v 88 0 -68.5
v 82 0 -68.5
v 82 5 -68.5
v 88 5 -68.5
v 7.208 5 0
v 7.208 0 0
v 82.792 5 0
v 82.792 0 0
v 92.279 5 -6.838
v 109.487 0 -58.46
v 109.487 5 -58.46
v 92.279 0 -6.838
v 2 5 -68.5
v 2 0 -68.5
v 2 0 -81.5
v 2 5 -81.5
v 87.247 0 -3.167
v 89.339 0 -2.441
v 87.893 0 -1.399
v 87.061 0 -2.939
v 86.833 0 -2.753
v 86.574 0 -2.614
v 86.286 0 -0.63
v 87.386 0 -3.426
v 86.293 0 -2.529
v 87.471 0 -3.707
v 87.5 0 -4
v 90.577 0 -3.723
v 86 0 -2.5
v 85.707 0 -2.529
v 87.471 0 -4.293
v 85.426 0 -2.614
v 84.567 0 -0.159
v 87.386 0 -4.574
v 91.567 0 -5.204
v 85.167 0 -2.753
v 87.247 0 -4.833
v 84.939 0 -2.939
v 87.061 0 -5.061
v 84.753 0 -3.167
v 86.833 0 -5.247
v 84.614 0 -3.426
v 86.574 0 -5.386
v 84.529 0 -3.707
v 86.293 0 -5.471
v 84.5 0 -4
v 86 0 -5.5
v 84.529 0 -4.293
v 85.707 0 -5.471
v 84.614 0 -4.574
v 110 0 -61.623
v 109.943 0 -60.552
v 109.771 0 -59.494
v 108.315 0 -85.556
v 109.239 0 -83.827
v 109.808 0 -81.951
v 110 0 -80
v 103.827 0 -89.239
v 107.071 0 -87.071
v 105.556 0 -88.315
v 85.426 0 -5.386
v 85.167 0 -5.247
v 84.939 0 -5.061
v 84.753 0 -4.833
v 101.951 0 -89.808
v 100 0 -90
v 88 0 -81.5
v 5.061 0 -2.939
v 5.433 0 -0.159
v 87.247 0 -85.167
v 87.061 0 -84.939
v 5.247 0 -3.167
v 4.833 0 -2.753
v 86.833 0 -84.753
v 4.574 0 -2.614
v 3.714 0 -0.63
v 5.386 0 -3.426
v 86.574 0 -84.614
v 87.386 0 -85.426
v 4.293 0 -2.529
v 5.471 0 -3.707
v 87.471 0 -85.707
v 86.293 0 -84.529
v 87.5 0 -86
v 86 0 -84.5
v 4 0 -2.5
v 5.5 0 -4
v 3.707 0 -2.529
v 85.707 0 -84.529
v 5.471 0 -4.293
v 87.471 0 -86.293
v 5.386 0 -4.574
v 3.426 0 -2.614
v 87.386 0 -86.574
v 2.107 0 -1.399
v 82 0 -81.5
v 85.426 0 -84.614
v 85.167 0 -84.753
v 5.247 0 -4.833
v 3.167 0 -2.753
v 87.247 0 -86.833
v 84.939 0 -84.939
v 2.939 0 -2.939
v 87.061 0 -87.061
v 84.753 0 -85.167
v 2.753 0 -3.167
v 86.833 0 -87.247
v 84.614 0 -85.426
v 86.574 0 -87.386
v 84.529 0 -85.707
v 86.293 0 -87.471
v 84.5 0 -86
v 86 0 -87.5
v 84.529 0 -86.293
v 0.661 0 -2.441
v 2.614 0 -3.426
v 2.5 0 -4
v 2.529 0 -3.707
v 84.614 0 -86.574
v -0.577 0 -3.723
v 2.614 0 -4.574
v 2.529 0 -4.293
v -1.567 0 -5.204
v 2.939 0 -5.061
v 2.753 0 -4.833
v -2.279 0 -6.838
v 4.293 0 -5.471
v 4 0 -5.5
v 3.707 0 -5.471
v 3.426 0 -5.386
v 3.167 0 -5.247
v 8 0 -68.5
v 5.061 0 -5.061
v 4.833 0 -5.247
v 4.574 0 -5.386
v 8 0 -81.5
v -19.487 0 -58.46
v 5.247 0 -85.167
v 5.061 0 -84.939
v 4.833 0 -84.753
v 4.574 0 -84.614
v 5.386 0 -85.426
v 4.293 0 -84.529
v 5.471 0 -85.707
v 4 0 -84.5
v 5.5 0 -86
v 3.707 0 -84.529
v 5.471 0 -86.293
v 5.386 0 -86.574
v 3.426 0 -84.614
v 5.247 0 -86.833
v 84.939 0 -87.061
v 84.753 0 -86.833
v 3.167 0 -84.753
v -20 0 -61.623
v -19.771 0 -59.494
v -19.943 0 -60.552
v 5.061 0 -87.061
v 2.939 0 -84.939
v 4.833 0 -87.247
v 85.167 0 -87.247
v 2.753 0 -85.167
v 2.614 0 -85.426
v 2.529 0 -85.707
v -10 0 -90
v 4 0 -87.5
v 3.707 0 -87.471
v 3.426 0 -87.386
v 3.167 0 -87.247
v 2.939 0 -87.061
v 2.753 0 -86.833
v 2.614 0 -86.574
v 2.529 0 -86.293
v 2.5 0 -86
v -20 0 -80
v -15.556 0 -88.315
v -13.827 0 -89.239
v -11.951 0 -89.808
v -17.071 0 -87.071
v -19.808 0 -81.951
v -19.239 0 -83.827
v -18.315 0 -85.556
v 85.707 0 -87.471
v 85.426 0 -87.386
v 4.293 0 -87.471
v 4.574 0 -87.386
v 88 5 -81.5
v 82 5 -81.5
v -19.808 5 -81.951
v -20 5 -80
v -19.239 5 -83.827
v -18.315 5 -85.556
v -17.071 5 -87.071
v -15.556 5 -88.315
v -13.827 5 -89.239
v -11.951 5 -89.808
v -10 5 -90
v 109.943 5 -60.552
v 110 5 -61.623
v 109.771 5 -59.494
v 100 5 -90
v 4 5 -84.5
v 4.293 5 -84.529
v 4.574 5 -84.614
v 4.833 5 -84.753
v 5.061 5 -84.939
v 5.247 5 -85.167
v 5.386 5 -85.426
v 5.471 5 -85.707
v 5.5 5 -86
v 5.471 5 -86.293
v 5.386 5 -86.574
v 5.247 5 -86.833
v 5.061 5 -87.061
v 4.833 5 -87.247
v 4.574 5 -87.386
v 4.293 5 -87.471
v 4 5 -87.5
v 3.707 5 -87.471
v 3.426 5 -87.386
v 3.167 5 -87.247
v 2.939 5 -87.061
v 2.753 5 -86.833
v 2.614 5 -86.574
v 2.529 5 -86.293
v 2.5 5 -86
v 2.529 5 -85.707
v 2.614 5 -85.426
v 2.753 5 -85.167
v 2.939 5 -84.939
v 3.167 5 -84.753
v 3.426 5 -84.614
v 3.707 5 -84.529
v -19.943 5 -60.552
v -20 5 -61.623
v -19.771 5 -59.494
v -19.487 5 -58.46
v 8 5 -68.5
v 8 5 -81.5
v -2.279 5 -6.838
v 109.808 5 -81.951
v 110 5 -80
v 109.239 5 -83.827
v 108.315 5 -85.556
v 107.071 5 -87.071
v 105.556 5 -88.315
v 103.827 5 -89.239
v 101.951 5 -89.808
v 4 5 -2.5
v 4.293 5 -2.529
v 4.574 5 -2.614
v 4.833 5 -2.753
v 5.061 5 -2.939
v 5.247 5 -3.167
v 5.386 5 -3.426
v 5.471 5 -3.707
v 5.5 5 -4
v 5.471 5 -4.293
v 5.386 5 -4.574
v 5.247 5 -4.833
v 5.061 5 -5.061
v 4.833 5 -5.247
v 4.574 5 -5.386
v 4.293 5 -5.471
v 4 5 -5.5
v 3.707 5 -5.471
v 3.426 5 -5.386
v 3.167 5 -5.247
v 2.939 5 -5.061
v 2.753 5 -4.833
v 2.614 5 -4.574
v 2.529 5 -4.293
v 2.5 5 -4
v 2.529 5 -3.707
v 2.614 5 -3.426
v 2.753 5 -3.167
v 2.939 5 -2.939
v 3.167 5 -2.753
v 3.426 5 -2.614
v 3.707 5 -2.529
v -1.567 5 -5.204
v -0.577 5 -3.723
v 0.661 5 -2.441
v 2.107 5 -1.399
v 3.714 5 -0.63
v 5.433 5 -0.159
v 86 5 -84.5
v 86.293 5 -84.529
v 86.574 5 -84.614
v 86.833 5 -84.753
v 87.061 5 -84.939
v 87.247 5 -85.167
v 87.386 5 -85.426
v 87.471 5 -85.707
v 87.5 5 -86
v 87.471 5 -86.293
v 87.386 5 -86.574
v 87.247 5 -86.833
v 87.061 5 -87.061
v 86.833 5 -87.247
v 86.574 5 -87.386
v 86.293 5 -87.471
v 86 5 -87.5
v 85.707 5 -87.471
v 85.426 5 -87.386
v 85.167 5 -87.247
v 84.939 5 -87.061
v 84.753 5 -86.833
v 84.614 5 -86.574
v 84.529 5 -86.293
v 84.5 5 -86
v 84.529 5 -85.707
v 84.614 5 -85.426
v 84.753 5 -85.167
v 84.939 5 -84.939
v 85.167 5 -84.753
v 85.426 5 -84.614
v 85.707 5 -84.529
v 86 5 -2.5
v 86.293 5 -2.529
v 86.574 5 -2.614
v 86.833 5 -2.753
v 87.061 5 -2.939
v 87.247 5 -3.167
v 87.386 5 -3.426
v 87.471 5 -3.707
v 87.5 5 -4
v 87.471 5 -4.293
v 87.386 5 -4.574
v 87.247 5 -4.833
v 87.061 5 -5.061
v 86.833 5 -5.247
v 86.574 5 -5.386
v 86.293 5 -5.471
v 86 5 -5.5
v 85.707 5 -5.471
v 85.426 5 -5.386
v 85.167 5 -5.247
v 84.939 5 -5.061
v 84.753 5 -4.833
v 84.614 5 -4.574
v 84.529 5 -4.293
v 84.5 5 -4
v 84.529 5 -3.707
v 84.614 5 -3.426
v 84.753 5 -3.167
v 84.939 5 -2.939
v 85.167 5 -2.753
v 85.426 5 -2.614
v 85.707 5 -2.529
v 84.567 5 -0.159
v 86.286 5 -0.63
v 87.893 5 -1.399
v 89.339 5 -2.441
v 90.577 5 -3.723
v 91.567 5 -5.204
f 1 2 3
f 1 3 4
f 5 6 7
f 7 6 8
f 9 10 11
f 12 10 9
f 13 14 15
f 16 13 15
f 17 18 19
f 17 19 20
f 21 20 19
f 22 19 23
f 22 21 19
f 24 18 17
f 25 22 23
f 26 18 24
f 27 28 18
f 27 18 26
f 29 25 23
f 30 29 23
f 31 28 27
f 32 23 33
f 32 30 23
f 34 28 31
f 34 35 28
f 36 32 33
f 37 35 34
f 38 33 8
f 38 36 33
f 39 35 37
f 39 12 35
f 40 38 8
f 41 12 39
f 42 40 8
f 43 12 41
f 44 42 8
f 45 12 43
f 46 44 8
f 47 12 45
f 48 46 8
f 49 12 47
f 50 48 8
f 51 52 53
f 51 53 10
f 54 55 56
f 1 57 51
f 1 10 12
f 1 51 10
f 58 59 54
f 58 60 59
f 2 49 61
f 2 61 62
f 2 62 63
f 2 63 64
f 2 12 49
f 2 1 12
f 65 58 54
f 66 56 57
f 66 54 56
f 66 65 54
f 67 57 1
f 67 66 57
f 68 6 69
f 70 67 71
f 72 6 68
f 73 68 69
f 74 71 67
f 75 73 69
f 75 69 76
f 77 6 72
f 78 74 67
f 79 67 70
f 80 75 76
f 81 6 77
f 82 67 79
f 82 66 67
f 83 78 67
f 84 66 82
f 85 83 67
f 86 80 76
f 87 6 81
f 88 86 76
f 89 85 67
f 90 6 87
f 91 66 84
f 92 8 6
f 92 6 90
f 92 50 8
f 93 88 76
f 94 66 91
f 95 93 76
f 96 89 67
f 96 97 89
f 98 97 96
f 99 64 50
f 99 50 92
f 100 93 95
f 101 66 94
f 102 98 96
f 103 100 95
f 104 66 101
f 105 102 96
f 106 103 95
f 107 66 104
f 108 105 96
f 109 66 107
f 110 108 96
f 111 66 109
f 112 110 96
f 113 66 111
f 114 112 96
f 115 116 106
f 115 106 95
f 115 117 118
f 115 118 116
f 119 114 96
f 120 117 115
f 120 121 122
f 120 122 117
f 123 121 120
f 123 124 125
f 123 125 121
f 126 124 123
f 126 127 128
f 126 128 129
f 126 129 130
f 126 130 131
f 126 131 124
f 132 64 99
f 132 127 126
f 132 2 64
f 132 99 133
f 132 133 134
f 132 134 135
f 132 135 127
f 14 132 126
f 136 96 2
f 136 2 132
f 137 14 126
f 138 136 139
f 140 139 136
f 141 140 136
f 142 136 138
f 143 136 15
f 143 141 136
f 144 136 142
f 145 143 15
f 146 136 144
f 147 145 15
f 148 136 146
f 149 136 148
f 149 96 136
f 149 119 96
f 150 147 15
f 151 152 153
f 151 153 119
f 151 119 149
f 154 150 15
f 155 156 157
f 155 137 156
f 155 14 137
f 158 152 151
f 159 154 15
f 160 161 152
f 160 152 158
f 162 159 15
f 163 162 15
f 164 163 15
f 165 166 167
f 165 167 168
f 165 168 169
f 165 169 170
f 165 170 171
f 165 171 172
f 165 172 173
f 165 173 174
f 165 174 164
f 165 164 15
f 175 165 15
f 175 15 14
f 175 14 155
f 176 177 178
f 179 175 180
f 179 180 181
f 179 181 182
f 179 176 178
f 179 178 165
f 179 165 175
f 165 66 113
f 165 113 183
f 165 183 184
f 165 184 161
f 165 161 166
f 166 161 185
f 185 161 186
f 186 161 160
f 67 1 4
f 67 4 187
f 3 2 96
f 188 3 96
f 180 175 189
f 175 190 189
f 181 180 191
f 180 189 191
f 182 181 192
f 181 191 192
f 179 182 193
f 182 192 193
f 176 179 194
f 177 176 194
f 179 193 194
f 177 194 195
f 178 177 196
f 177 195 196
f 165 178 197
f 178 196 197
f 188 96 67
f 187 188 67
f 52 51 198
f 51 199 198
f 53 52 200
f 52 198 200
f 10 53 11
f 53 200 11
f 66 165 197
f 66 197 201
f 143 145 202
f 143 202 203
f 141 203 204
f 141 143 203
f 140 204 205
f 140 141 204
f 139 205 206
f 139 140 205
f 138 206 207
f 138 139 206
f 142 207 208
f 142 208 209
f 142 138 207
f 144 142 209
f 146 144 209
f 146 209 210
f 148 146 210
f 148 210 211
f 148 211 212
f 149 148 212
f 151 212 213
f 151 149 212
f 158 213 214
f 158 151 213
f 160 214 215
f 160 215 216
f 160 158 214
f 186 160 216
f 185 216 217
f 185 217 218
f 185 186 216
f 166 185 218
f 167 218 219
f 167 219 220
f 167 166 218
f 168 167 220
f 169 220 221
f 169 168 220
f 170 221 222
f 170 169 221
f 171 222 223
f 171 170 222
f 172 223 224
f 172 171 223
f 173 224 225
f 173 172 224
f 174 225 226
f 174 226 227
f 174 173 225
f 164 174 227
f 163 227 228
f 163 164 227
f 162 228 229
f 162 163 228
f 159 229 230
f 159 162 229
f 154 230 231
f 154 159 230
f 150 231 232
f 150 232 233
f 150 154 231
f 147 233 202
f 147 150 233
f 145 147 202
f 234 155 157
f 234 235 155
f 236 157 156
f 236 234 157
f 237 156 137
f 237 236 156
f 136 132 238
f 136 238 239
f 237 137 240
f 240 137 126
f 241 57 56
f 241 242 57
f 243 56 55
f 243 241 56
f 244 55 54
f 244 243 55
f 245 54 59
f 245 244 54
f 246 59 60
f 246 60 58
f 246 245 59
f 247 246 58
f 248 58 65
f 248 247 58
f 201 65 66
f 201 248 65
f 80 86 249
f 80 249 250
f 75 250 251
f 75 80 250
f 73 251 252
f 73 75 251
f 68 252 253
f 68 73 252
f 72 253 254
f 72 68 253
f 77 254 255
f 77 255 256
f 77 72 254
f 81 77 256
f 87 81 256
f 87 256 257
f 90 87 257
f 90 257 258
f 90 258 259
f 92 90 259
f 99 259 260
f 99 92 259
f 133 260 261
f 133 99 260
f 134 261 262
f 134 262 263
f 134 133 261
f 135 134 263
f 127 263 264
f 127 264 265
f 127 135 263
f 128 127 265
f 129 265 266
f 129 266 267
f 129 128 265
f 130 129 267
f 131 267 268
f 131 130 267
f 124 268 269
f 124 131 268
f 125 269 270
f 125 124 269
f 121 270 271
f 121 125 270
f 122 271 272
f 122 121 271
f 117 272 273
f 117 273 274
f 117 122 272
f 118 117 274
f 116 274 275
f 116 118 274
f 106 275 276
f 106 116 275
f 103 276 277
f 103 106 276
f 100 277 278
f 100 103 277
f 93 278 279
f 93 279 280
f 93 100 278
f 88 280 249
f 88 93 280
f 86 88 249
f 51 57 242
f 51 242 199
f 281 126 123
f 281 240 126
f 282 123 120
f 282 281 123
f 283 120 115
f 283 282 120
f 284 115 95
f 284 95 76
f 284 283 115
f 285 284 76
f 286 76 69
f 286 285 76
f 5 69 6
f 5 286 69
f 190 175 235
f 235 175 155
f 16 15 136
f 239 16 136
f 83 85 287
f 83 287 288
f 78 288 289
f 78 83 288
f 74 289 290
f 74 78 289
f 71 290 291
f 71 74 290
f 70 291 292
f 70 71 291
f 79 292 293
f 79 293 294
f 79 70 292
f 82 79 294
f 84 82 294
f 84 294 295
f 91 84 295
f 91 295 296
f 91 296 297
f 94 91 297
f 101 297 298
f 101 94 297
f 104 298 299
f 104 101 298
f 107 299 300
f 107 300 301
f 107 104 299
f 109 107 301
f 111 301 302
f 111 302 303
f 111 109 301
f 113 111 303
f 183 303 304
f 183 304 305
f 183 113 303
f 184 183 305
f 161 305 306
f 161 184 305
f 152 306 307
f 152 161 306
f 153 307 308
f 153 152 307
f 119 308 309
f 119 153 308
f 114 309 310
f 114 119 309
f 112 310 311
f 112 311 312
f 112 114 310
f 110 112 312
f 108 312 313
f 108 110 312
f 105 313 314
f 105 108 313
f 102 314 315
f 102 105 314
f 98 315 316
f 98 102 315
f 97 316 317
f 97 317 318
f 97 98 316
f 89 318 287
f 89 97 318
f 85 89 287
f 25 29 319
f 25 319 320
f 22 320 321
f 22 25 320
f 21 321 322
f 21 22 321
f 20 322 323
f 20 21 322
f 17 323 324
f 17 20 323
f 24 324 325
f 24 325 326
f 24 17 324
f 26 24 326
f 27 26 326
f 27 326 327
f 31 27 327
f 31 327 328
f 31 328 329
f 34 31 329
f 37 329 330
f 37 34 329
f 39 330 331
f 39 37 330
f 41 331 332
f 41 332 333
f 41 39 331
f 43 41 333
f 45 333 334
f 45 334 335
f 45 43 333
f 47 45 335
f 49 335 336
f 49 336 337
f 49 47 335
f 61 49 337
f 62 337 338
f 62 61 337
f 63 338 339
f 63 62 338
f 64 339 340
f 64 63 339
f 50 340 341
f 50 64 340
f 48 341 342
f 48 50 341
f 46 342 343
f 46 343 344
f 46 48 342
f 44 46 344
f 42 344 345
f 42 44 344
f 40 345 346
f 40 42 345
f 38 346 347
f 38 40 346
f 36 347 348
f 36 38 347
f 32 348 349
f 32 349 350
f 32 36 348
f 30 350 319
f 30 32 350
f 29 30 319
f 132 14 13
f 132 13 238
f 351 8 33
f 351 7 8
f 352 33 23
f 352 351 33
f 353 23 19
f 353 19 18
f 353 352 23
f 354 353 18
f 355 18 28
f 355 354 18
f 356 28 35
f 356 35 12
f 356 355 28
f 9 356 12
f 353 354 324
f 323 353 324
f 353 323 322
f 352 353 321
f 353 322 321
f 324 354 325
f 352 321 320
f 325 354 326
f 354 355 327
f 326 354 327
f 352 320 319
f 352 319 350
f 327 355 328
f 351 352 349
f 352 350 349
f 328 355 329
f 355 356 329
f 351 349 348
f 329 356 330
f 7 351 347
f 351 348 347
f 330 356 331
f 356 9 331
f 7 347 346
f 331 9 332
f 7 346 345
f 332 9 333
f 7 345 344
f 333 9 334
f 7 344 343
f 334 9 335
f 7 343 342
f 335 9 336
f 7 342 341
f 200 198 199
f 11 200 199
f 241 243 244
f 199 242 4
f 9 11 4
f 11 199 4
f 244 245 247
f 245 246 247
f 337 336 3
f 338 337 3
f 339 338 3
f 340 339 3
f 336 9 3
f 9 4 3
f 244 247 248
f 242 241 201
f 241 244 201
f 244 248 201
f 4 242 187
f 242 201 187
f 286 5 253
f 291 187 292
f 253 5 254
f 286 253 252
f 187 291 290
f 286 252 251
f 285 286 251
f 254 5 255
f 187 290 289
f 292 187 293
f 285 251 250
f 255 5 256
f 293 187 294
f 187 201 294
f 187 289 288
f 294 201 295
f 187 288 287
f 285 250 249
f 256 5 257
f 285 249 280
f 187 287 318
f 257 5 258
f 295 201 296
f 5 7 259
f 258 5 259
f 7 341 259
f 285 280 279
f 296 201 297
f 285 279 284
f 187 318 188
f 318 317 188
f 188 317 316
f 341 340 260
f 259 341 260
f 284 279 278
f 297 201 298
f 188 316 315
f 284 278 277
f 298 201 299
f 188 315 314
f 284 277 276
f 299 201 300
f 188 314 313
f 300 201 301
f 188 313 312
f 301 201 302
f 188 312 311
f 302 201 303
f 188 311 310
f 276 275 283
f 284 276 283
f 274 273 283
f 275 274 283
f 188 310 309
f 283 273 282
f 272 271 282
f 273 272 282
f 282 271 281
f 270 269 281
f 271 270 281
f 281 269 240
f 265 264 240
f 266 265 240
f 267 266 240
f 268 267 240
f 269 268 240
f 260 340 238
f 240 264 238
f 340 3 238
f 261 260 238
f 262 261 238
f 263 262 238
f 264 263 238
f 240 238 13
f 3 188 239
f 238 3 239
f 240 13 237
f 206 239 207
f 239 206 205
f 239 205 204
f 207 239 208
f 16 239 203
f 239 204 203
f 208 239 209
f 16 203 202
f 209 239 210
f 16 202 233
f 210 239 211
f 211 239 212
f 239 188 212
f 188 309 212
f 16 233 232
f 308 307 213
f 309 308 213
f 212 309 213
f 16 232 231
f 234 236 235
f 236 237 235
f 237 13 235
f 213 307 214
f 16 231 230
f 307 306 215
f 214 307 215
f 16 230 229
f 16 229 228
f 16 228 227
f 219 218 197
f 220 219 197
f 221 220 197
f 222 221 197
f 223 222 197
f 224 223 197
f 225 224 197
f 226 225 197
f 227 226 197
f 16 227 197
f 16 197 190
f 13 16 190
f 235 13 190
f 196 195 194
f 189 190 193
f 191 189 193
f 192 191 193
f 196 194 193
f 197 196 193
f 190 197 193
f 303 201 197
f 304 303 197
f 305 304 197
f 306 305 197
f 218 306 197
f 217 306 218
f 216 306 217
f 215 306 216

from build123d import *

# Parameters (mm, degrees)
SKETCH1_W           = 90
SKETCH1_H           = 90
SKETCH1_R           = 1.5
SKETCH1_W_2         = 6
SKETCH1_H_2         = 13
BOSS_EXTRUDE9_DEPTH = 5
FILLET2_R           = 10


with BuildPart() as part:
    # Sketch1 → Boss-Extrude9 (new body)
    # profile 1 of 3: a face of its own
    with BuildSketch(Plane(origin=(0, 0, 0), x_dir=(1, 0, 0), z_dir=(0, 1, 0))):
        Polygon((-20, 90), (-20, 60), (0, 0), (0, 90), align=None)
    # profile 2 of 3: a face of its own
    with BuildSketch(Plane(origin=(0, 0, 0), x_dir=(1, 0, 0), z_dir=(0, 1, 0))):
        with Locations((45, 45)):
            Rectangle(SKETCH1_W, SKETCH1_H)
        with Locations(Location((4, 4, 0), (0, 0, 270))):
            Circle(SKETCH1_R, mode=Mode.SUBTRACT)
        with Locations(Location((86, 4, 0), (0, 0, 270))):
            Circle(SKETCH1_R, mode=Mode.SUBTRACT)
        with Locations((5, 75)):
            Rectangle(SKETCH1_W_2, SKETCH1_H_2, mode=Mode.SUBTRACT)
        with Locations(Location((4, 86, 0), (0, 0, 270))):
            Circle(SKETCH1_R, mode=Mode.SUBTRACT)
        with Locations((85, 75)):
            Rectangle(SKETCH1_W_2, SKETCH1_H_2, mode=Mode.SUBTRACT)
        with Locations(Location((86, 86, 0), (0, 0, 270))):
            Circle(SKETCH1_R, mode=Mode.SUBTRACT)
    # profile 3 of 3: a face of its own
    with BuildSketch(Plane(origin=(0, 0, 0), x_dir=(1, 0, 0), z_dir=(0, 1, 0))):
        Polygon((110, 90), (110, 60), (90, 0), (90, 90), align=None)
    extrude(amount=BOSS_EXTRUDE9_DEPTH)

    # Fillet2
    fillet2_edges = [part.edges().sort_by_distance(p)[0] for p in [
        (-20, 2.5, -90),
        (110, 2.5, -90),
        (110, 2.5, -60),
        (90, 2.5, 0),
        (0, 2.5, 0),
        (-20, 2.5, -60),
    ]]
    fillet(fillet2_edges, radius=FILLET2_R)


solid = part.part
